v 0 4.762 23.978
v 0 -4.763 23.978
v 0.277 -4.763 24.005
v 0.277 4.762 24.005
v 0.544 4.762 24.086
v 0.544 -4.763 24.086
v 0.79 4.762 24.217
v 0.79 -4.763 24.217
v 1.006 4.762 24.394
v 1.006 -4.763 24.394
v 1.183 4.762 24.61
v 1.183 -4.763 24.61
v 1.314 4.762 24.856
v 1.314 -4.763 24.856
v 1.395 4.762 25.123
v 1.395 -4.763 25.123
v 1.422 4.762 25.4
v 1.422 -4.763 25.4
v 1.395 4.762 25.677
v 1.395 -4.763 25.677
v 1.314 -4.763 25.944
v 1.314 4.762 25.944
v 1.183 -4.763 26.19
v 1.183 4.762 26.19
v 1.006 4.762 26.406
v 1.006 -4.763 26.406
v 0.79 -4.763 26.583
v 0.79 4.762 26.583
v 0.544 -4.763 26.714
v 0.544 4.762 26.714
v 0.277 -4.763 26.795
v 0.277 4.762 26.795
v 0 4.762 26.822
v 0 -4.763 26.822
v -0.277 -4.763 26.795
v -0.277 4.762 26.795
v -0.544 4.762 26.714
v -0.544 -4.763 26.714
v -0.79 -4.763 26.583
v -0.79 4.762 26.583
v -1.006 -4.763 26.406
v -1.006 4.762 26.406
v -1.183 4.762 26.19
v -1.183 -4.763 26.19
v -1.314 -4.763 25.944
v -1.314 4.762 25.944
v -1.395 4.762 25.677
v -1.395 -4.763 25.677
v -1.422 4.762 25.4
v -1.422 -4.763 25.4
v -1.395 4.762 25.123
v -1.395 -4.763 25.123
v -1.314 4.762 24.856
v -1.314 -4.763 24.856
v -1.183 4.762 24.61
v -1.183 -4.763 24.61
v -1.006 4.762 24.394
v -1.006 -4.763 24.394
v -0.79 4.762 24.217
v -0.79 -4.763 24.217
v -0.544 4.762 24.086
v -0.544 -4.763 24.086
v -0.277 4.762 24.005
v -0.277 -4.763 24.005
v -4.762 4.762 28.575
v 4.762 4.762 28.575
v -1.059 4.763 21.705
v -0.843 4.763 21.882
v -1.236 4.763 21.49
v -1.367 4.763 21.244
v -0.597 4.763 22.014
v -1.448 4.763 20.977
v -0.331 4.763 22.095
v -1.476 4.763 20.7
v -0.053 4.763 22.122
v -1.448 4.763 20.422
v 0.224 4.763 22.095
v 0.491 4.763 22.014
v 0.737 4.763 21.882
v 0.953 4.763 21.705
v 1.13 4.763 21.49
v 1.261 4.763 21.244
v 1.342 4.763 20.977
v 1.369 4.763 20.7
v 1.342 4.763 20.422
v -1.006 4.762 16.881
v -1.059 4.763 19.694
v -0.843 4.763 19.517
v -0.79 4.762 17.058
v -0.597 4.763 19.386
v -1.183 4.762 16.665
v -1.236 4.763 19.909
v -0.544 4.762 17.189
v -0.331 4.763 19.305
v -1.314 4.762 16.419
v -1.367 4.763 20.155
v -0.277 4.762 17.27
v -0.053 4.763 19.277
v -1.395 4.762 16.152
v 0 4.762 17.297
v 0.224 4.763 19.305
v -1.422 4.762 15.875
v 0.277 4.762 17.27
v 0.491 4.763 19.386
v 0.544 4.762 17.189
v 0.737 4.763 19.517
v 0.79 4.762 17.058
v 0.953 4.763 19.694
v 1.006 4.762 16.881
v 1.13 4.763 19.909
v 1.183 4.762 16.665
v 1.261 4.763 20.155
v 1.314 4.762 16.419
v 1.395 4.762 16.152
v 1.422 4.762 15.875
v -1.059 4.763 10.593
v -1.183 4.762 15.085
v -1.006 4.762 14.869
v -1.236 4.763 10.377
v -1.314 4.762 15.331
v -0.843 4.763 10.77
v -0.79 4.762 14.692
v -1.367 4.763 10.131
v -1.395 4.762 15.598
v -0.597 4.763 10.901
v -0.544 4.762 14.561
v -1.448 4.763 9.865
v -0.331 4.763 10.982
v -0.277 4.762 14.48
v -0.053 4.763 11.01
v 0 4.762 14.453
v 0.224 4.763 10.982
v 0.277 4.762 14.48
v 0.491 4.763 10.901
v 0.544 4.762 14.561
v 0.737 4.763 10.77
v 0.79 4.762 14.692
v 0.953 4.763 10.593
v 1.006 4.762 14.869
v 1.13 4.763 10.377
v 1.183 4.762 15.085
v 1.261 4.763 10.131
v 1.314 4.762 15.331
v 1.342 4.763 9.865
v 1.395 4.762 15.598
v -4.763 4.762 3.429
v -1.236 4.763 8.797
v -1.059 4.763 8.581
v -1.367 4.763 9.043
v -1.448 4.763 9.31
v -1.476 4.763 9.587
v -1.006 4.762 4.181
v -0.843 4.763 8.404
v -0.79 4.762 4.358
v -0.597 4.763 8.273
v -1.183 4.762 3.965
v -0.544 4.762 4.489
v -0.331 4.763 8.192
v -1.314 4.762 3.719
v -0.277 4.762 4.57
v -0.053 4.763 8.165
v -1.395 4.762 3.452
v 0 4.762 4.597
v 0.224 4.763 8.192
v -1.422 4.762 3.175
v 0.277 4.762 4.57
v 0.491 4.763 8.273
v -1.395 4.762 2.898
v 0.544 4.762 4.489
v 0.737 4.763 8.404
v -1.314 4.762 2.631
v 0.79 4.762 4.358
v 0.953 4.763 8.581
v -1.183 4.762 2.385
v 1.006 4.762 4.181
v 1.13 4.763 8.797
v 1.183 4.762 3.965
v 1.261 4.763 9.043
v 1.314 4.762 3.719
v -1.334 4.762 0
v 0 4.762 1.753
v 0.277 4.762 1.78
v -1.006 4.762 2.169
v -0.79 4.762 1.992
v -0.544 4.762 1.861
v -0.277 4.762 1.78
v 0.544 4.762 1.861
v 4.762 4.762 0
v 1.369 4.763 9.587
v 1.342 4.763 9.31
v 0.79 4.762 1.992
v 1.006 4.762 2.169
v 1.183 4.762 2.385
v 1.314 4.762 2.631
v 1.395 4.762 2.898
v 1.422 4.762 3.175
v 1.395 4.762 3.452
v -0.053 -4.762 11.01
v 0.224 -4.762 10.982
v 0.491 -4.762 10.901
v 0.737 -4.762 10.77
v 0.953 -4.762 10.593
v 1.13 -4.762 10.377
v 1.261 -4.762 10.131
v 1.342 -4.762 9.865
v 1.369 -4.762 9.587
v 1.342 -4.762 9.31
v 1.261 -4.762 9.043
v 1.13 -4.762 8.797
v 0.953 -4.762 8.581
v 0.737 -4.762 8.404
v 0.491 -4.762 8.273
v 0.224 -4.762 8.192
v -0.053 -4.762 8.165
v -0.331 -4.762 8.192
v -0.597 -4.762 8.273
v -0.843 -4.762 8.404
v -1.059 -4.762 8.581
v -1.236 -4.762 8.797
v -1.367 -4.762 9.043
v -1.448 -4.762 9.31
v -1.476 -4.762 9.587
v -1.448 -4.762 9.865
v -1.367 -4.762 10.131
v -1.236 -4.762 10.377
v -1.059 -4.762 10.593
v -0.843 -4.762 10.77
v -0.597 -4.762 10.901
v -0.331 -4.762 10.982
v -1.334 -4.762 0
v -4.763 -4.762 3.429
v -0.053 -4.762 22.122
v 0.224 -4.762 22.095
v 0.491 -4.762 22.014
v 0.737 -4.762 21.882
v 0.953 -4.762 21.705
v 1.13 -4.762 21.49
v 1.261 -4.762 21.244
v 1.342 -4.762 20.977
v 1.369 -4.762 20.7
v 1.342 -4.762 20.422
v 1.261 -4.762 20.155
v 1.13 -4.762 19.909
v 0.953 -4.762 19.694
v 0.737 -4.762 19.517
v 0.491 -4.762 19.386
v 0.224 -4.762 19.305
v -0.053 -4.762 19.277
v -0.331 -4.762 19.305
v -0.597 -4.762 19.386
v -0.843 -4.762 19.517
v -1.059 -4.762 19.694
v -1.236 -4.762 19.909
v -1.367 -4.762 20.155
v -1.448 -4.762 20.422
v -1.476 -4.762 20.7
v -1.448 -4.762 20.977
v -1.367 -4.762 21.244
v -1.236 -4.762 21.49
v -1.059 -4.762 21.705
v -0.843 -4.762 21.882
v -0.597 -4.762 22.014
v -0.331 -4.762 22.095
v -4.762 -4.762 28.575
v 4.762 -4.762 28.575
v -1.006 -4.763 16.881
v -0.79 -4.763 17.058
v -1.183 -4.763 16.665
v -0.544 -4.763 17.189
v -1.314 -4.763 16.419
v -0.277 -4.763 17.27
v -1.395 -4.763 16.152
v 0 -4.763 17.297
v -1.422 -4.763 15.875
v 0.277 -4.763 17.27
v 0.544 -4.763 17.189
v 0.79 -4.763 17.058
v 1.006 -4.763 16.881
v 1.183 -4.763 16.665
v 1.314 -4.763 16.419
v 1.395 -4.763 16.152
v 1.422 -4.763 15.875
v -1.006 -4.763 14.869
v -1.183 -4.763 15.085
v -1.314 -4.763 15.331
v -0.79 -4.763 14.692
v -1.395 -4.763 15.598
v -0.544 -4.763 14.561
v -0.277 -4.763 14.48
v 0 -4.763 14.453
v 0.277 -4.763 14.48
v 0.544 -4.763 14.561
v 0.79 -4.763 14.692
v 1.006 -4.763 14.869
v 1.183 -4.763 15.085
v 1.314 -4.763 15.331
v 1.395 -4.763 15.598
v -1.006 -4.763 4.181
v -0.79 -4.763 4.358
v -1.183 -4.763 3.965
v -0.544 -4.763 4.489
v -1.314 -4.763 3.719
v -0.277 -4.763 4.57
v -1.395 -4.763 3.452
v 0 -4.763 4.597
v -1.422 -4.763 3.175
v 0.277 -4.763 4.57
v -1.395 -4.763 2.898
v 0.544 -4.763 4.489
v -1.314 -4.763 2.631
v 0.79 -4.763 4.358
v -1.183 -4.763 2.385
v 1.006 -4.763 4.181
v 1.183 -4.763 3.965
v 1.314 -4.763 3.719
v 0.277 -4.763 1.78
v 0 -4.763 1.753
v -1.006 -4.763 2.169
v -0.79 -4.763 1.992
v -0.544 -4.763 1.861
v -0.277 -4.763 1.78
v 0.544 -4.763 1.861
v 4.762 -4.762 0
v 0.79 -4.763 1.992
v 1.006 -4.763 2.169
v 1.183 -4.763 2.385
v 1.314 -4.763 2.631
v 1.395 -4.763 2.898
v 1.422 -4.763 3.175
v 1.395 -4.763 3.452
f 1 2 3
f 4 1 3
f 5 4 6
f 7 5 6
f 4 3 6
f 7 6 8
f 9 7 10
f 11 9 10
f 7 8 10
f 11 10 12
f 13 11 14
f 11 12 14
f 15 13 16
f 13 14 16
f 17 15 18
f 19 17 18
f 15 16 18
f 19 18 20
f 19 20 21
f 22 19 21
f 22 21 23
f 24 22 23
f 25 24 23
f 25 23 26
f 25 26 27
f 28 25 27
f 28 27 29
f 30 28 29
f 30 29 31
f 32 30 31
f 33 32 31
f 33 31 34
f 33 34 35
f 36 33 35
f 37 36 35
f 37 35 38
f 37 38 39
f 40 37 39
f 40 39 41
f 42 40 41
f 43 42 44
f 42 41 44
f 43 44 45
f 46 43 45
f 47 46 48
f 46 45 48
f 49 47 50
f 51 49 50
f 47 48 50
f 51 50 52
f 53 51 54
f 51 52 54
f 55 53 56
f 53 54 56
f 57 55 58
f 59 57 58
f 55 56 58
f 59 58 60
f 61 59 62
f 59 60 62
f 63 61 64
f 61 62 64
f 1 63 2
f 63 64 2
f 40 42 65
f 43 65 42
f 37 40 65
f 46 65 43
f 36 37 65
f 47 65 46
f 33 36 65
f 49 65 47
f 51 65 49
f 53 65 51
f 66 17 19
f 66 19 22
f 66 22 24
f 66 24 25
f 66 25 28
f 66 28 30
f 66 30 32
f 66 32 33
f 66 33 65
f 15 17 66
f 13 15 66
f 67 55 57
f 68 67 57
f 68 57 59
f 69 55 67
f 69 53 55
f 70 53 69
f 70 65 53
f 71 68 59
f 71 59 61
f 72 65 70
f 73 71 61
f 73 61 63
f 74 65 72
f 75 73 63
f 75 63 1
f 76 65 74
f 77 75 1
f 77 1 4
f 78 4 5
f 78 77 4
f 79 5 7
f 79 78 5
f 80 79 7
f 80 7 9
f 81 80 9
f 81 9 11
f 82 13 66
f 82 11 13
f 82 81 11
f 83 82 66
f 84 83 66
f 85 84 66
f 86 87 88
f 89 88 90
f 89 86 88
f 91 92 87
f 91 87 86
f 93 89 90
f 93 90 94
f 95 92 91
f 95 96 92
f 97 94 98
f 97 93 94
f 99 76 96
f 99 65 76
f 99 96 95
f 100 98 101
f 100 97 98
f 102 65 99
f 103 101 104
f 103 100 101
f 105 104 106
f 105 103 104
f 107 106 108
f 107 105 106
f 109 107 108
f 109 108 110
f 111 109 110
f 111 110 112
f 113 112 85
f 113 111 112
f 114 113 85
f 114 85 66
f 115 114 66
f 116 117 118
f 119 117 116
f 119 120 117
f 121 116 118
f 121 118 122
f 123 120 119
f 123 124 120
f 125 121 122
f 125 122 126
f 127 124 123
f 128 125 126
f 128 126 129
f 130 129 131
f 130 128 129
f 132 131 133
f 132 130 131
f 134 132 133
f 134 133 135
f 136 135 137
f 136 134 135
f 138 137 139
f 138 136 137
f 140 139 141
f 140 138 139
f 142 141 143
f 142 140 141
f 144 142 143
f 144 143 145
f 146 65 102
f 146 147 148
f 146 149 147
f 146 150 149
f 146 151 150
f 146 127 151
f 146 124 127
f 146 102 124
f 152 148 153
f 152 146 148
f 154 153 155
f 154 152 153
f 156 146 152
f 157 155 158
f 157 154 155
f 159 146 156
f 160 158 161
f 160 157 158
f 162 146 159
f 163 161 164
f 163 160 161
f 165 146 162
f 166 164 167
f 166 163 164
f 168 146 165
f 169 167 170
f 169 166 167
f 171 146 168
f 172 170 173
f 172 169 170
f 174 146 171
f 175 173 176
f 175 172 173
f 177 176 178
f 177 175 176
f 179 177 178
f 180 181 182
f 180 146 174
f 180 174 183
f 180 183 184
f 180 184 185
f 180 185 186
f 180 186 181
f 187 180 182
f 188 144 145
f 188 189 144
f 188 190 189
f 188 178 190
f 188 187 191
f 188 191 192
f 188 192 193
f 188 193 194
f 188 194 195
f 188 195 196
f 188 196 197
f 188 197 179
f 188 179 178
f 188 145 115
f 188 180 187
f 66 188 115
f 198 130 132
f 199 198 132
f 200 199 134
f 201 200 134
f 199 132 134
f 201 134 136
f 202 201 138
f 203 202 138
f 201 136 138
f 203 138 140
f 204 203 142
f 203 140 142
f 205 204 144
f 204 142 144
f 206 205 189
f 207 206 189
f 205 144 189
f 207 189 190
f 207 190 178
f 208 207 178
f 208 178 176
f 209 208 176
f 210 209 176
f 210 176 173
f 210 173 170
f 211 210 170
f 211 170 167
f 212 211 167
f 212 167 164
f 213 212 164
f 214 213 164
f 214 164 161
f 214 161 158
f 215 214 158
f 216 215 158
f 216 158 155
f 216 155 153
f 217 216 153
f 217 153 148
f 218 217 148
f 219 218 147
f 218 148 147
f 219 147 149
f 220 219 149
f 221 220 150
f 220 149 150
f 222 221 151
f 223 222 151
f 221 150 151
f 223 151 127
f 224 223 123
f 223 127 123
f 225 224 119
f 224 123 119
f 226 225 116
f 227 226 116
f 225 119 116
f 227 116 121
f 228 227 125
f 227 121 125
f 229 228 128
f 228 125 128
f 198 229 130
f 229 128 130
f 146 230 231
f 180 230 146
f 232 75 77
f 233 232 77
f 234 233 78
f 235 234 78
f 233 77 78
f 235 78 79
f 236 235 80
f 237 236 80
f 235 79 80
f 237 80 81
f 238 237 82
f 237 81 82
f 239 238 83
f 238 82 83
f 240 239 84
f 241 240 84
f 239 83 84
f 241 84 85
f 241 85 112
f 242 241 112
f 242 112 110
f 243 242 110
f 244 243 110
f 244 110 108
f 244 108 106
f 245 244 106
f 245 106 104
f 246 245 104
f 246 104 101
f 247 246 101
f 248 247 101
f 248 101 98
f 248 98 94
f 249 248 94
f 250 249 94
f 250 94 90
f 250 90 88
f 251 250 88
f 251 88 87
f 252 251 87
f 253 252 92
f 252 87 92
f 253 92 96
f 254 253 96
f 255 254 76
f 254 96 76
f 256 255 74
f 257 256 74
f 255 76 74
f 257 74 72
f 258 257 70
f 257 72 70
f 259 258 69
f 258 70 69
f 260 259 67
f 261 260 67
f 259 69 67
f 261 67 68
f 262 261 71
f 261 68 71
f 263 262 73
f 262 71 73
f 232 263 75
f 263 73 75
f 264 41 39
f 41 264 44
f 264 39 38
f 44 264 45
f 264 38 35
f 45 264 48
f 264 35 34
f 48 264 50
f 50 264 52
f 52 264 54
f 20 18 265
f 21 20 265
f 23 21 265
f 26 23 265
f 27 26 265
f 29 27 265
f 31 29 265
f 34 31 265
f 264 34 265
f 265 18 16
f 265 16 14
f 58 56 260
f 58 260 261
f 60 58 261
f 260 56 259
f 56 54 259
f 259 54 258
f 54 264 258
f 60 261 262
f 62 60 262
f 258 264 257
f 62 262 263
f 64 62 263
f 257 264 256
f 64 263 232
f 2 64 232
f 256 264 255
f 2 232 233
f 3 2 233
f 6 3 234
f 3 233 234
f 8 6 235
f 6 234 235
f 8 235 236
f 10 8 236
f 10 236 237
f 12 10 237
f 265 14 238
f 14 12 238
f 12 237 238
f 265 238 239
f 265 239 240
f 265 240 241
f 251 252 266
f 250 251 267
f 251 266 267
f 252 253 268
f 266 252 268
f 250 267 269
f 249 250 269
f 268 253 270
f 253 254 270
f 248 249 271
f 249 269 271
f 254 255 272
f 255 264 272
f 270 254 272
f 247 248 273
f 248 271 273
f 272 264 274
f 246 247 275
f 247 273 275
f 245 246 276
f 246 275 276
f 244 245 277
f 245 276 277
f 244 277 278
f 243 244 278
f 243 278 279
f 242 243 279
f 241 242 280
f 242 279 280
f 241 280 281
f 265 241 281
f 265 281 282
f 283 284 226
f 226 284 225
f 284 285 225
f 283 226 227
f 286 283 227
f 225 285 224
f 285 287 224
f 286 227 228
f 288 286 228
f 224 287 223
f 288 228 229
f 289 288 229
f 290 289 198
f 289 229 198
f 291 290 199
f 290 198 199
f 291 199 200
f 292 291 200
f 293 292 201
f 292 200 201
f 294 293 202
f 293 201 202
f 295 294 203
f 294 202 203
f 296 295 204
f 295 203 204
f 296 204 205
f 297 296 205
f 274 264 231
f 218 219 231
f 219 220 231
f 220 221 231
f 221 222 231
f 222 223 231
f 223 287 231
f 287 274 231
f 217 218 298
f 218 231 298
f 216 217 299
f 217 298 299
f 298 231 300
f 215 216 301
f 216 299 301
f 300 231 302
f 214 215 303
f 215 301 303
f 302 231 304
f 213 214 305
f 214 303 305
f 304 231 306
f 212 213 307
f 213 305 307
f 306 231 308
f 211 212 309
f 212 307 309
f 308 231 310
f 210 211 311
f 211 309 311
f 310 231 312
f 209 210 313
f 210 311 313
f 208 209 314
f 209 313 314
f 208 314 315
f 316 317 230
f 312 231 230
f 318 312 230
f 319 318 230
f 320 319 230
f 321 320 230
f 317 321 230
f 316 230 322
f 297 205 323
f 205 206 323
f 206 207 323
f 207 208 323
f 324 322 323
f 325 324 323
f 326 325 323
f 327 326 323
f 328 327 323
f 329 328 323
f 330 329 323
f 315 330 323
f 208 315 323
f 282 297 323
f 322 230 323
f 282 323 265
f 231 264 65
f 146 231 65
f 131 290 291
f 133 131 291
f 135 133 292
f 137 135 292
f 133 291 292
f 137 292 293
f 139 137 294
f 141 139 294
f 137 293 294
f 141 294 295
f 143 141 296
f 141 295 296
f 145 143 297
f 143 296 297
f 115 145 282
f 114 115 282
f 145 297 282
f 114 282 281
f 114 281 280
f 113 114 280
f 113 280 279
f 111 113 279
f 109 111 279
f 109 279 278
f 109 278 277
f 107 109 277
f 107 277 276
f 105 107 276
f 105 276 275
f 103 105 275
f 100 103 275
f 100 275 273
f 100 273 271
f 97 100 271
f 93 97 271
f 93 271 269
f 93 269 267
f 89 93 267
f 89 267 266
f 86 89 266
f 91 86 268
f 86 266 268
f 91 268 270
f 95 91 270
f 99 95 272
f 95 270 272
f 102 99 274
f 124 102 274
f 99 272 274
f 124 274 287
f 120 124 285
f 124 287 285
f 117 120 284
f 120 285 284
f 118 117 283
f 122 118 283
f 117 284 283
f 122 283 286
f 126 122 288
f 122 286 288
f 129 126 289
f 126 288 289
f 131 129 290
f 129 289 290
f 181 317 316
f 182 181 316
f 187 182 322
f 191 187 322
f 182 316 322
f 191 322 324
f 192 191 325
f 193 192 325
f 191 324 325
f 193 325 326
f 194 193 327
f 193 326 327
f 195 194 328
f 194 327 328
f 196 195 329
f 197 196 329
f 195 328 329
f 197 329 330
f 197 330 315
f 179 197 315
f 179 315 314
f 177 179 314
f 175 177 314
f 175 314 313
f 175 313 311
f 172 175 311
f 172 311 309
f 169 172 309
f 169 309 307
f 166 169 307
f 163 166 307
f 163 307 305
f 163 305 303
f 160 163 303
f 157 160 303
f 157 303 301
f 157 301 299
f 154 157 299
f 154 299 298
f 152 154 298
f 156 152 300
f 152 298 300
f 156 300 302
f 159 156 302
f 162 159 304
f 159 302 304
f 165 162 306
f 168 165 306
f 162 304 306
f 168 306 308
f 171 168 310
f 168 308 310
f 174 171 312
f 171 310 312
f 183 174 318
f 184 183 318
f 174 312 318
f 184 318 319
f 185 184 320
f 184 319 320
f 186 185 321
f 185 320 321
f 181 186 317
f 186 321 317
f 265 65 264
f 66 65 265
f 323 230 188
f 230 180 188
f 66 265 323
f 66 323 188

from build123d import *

# Parameters (mm, degrees)
SKETCH1_W             = 9.525
SKETCH1_H             = 9.525
EXTRUDE1_DEPTH        = 28.575
F_4_40_TAPPED_HOLE1_D = 2.8448
F_4_40_TAPPED_HOLE2_D = 2.8448
CHAMFER1_SIZE         = 3.429


with BuildPart() as part:
    # Sketch1 → Extrude1 (new body)
    with BuildSketch(Plane.XY):
        Rectangle(SKETCH1_W, SKETCH1_H)
    extrude(amount=EXTRUDE1_DEPTH)

    # #4-40 Tapped Hole1 (through all)
    with Locations(Plane(origin=(0, 4.7625, 3.175), x_dir=(0, 0, 1), z_dir=(0, 1, 0))):
        with Locations((0, 0), (12.7, 0), (22.225, 0)):
            Hole(F_4_40_TAPPED_HOLE1_D / 2)

    # #4-40 Tapped Hole2 (through all)
    with Locations(Plane(origin=(-0.053117728, -4.7625, 20.699632052), x_dir=(0, 0, -1), z_dir=(0, -1, 0))):
        with Locations((0, 0), (11.1125, 0)):
            Hole(F_4_40_TAPPED_HOLE2_D / 2)

    # Chamfer1
    chamfer1_edges = [part.edges().sort_by_distance(p)[0] for p in [
        (-4.7625, 0, 0),
    ]]
    chamfer(chamfer1_edges, length=CHAMFER1_SIZE)


solid = part.part
